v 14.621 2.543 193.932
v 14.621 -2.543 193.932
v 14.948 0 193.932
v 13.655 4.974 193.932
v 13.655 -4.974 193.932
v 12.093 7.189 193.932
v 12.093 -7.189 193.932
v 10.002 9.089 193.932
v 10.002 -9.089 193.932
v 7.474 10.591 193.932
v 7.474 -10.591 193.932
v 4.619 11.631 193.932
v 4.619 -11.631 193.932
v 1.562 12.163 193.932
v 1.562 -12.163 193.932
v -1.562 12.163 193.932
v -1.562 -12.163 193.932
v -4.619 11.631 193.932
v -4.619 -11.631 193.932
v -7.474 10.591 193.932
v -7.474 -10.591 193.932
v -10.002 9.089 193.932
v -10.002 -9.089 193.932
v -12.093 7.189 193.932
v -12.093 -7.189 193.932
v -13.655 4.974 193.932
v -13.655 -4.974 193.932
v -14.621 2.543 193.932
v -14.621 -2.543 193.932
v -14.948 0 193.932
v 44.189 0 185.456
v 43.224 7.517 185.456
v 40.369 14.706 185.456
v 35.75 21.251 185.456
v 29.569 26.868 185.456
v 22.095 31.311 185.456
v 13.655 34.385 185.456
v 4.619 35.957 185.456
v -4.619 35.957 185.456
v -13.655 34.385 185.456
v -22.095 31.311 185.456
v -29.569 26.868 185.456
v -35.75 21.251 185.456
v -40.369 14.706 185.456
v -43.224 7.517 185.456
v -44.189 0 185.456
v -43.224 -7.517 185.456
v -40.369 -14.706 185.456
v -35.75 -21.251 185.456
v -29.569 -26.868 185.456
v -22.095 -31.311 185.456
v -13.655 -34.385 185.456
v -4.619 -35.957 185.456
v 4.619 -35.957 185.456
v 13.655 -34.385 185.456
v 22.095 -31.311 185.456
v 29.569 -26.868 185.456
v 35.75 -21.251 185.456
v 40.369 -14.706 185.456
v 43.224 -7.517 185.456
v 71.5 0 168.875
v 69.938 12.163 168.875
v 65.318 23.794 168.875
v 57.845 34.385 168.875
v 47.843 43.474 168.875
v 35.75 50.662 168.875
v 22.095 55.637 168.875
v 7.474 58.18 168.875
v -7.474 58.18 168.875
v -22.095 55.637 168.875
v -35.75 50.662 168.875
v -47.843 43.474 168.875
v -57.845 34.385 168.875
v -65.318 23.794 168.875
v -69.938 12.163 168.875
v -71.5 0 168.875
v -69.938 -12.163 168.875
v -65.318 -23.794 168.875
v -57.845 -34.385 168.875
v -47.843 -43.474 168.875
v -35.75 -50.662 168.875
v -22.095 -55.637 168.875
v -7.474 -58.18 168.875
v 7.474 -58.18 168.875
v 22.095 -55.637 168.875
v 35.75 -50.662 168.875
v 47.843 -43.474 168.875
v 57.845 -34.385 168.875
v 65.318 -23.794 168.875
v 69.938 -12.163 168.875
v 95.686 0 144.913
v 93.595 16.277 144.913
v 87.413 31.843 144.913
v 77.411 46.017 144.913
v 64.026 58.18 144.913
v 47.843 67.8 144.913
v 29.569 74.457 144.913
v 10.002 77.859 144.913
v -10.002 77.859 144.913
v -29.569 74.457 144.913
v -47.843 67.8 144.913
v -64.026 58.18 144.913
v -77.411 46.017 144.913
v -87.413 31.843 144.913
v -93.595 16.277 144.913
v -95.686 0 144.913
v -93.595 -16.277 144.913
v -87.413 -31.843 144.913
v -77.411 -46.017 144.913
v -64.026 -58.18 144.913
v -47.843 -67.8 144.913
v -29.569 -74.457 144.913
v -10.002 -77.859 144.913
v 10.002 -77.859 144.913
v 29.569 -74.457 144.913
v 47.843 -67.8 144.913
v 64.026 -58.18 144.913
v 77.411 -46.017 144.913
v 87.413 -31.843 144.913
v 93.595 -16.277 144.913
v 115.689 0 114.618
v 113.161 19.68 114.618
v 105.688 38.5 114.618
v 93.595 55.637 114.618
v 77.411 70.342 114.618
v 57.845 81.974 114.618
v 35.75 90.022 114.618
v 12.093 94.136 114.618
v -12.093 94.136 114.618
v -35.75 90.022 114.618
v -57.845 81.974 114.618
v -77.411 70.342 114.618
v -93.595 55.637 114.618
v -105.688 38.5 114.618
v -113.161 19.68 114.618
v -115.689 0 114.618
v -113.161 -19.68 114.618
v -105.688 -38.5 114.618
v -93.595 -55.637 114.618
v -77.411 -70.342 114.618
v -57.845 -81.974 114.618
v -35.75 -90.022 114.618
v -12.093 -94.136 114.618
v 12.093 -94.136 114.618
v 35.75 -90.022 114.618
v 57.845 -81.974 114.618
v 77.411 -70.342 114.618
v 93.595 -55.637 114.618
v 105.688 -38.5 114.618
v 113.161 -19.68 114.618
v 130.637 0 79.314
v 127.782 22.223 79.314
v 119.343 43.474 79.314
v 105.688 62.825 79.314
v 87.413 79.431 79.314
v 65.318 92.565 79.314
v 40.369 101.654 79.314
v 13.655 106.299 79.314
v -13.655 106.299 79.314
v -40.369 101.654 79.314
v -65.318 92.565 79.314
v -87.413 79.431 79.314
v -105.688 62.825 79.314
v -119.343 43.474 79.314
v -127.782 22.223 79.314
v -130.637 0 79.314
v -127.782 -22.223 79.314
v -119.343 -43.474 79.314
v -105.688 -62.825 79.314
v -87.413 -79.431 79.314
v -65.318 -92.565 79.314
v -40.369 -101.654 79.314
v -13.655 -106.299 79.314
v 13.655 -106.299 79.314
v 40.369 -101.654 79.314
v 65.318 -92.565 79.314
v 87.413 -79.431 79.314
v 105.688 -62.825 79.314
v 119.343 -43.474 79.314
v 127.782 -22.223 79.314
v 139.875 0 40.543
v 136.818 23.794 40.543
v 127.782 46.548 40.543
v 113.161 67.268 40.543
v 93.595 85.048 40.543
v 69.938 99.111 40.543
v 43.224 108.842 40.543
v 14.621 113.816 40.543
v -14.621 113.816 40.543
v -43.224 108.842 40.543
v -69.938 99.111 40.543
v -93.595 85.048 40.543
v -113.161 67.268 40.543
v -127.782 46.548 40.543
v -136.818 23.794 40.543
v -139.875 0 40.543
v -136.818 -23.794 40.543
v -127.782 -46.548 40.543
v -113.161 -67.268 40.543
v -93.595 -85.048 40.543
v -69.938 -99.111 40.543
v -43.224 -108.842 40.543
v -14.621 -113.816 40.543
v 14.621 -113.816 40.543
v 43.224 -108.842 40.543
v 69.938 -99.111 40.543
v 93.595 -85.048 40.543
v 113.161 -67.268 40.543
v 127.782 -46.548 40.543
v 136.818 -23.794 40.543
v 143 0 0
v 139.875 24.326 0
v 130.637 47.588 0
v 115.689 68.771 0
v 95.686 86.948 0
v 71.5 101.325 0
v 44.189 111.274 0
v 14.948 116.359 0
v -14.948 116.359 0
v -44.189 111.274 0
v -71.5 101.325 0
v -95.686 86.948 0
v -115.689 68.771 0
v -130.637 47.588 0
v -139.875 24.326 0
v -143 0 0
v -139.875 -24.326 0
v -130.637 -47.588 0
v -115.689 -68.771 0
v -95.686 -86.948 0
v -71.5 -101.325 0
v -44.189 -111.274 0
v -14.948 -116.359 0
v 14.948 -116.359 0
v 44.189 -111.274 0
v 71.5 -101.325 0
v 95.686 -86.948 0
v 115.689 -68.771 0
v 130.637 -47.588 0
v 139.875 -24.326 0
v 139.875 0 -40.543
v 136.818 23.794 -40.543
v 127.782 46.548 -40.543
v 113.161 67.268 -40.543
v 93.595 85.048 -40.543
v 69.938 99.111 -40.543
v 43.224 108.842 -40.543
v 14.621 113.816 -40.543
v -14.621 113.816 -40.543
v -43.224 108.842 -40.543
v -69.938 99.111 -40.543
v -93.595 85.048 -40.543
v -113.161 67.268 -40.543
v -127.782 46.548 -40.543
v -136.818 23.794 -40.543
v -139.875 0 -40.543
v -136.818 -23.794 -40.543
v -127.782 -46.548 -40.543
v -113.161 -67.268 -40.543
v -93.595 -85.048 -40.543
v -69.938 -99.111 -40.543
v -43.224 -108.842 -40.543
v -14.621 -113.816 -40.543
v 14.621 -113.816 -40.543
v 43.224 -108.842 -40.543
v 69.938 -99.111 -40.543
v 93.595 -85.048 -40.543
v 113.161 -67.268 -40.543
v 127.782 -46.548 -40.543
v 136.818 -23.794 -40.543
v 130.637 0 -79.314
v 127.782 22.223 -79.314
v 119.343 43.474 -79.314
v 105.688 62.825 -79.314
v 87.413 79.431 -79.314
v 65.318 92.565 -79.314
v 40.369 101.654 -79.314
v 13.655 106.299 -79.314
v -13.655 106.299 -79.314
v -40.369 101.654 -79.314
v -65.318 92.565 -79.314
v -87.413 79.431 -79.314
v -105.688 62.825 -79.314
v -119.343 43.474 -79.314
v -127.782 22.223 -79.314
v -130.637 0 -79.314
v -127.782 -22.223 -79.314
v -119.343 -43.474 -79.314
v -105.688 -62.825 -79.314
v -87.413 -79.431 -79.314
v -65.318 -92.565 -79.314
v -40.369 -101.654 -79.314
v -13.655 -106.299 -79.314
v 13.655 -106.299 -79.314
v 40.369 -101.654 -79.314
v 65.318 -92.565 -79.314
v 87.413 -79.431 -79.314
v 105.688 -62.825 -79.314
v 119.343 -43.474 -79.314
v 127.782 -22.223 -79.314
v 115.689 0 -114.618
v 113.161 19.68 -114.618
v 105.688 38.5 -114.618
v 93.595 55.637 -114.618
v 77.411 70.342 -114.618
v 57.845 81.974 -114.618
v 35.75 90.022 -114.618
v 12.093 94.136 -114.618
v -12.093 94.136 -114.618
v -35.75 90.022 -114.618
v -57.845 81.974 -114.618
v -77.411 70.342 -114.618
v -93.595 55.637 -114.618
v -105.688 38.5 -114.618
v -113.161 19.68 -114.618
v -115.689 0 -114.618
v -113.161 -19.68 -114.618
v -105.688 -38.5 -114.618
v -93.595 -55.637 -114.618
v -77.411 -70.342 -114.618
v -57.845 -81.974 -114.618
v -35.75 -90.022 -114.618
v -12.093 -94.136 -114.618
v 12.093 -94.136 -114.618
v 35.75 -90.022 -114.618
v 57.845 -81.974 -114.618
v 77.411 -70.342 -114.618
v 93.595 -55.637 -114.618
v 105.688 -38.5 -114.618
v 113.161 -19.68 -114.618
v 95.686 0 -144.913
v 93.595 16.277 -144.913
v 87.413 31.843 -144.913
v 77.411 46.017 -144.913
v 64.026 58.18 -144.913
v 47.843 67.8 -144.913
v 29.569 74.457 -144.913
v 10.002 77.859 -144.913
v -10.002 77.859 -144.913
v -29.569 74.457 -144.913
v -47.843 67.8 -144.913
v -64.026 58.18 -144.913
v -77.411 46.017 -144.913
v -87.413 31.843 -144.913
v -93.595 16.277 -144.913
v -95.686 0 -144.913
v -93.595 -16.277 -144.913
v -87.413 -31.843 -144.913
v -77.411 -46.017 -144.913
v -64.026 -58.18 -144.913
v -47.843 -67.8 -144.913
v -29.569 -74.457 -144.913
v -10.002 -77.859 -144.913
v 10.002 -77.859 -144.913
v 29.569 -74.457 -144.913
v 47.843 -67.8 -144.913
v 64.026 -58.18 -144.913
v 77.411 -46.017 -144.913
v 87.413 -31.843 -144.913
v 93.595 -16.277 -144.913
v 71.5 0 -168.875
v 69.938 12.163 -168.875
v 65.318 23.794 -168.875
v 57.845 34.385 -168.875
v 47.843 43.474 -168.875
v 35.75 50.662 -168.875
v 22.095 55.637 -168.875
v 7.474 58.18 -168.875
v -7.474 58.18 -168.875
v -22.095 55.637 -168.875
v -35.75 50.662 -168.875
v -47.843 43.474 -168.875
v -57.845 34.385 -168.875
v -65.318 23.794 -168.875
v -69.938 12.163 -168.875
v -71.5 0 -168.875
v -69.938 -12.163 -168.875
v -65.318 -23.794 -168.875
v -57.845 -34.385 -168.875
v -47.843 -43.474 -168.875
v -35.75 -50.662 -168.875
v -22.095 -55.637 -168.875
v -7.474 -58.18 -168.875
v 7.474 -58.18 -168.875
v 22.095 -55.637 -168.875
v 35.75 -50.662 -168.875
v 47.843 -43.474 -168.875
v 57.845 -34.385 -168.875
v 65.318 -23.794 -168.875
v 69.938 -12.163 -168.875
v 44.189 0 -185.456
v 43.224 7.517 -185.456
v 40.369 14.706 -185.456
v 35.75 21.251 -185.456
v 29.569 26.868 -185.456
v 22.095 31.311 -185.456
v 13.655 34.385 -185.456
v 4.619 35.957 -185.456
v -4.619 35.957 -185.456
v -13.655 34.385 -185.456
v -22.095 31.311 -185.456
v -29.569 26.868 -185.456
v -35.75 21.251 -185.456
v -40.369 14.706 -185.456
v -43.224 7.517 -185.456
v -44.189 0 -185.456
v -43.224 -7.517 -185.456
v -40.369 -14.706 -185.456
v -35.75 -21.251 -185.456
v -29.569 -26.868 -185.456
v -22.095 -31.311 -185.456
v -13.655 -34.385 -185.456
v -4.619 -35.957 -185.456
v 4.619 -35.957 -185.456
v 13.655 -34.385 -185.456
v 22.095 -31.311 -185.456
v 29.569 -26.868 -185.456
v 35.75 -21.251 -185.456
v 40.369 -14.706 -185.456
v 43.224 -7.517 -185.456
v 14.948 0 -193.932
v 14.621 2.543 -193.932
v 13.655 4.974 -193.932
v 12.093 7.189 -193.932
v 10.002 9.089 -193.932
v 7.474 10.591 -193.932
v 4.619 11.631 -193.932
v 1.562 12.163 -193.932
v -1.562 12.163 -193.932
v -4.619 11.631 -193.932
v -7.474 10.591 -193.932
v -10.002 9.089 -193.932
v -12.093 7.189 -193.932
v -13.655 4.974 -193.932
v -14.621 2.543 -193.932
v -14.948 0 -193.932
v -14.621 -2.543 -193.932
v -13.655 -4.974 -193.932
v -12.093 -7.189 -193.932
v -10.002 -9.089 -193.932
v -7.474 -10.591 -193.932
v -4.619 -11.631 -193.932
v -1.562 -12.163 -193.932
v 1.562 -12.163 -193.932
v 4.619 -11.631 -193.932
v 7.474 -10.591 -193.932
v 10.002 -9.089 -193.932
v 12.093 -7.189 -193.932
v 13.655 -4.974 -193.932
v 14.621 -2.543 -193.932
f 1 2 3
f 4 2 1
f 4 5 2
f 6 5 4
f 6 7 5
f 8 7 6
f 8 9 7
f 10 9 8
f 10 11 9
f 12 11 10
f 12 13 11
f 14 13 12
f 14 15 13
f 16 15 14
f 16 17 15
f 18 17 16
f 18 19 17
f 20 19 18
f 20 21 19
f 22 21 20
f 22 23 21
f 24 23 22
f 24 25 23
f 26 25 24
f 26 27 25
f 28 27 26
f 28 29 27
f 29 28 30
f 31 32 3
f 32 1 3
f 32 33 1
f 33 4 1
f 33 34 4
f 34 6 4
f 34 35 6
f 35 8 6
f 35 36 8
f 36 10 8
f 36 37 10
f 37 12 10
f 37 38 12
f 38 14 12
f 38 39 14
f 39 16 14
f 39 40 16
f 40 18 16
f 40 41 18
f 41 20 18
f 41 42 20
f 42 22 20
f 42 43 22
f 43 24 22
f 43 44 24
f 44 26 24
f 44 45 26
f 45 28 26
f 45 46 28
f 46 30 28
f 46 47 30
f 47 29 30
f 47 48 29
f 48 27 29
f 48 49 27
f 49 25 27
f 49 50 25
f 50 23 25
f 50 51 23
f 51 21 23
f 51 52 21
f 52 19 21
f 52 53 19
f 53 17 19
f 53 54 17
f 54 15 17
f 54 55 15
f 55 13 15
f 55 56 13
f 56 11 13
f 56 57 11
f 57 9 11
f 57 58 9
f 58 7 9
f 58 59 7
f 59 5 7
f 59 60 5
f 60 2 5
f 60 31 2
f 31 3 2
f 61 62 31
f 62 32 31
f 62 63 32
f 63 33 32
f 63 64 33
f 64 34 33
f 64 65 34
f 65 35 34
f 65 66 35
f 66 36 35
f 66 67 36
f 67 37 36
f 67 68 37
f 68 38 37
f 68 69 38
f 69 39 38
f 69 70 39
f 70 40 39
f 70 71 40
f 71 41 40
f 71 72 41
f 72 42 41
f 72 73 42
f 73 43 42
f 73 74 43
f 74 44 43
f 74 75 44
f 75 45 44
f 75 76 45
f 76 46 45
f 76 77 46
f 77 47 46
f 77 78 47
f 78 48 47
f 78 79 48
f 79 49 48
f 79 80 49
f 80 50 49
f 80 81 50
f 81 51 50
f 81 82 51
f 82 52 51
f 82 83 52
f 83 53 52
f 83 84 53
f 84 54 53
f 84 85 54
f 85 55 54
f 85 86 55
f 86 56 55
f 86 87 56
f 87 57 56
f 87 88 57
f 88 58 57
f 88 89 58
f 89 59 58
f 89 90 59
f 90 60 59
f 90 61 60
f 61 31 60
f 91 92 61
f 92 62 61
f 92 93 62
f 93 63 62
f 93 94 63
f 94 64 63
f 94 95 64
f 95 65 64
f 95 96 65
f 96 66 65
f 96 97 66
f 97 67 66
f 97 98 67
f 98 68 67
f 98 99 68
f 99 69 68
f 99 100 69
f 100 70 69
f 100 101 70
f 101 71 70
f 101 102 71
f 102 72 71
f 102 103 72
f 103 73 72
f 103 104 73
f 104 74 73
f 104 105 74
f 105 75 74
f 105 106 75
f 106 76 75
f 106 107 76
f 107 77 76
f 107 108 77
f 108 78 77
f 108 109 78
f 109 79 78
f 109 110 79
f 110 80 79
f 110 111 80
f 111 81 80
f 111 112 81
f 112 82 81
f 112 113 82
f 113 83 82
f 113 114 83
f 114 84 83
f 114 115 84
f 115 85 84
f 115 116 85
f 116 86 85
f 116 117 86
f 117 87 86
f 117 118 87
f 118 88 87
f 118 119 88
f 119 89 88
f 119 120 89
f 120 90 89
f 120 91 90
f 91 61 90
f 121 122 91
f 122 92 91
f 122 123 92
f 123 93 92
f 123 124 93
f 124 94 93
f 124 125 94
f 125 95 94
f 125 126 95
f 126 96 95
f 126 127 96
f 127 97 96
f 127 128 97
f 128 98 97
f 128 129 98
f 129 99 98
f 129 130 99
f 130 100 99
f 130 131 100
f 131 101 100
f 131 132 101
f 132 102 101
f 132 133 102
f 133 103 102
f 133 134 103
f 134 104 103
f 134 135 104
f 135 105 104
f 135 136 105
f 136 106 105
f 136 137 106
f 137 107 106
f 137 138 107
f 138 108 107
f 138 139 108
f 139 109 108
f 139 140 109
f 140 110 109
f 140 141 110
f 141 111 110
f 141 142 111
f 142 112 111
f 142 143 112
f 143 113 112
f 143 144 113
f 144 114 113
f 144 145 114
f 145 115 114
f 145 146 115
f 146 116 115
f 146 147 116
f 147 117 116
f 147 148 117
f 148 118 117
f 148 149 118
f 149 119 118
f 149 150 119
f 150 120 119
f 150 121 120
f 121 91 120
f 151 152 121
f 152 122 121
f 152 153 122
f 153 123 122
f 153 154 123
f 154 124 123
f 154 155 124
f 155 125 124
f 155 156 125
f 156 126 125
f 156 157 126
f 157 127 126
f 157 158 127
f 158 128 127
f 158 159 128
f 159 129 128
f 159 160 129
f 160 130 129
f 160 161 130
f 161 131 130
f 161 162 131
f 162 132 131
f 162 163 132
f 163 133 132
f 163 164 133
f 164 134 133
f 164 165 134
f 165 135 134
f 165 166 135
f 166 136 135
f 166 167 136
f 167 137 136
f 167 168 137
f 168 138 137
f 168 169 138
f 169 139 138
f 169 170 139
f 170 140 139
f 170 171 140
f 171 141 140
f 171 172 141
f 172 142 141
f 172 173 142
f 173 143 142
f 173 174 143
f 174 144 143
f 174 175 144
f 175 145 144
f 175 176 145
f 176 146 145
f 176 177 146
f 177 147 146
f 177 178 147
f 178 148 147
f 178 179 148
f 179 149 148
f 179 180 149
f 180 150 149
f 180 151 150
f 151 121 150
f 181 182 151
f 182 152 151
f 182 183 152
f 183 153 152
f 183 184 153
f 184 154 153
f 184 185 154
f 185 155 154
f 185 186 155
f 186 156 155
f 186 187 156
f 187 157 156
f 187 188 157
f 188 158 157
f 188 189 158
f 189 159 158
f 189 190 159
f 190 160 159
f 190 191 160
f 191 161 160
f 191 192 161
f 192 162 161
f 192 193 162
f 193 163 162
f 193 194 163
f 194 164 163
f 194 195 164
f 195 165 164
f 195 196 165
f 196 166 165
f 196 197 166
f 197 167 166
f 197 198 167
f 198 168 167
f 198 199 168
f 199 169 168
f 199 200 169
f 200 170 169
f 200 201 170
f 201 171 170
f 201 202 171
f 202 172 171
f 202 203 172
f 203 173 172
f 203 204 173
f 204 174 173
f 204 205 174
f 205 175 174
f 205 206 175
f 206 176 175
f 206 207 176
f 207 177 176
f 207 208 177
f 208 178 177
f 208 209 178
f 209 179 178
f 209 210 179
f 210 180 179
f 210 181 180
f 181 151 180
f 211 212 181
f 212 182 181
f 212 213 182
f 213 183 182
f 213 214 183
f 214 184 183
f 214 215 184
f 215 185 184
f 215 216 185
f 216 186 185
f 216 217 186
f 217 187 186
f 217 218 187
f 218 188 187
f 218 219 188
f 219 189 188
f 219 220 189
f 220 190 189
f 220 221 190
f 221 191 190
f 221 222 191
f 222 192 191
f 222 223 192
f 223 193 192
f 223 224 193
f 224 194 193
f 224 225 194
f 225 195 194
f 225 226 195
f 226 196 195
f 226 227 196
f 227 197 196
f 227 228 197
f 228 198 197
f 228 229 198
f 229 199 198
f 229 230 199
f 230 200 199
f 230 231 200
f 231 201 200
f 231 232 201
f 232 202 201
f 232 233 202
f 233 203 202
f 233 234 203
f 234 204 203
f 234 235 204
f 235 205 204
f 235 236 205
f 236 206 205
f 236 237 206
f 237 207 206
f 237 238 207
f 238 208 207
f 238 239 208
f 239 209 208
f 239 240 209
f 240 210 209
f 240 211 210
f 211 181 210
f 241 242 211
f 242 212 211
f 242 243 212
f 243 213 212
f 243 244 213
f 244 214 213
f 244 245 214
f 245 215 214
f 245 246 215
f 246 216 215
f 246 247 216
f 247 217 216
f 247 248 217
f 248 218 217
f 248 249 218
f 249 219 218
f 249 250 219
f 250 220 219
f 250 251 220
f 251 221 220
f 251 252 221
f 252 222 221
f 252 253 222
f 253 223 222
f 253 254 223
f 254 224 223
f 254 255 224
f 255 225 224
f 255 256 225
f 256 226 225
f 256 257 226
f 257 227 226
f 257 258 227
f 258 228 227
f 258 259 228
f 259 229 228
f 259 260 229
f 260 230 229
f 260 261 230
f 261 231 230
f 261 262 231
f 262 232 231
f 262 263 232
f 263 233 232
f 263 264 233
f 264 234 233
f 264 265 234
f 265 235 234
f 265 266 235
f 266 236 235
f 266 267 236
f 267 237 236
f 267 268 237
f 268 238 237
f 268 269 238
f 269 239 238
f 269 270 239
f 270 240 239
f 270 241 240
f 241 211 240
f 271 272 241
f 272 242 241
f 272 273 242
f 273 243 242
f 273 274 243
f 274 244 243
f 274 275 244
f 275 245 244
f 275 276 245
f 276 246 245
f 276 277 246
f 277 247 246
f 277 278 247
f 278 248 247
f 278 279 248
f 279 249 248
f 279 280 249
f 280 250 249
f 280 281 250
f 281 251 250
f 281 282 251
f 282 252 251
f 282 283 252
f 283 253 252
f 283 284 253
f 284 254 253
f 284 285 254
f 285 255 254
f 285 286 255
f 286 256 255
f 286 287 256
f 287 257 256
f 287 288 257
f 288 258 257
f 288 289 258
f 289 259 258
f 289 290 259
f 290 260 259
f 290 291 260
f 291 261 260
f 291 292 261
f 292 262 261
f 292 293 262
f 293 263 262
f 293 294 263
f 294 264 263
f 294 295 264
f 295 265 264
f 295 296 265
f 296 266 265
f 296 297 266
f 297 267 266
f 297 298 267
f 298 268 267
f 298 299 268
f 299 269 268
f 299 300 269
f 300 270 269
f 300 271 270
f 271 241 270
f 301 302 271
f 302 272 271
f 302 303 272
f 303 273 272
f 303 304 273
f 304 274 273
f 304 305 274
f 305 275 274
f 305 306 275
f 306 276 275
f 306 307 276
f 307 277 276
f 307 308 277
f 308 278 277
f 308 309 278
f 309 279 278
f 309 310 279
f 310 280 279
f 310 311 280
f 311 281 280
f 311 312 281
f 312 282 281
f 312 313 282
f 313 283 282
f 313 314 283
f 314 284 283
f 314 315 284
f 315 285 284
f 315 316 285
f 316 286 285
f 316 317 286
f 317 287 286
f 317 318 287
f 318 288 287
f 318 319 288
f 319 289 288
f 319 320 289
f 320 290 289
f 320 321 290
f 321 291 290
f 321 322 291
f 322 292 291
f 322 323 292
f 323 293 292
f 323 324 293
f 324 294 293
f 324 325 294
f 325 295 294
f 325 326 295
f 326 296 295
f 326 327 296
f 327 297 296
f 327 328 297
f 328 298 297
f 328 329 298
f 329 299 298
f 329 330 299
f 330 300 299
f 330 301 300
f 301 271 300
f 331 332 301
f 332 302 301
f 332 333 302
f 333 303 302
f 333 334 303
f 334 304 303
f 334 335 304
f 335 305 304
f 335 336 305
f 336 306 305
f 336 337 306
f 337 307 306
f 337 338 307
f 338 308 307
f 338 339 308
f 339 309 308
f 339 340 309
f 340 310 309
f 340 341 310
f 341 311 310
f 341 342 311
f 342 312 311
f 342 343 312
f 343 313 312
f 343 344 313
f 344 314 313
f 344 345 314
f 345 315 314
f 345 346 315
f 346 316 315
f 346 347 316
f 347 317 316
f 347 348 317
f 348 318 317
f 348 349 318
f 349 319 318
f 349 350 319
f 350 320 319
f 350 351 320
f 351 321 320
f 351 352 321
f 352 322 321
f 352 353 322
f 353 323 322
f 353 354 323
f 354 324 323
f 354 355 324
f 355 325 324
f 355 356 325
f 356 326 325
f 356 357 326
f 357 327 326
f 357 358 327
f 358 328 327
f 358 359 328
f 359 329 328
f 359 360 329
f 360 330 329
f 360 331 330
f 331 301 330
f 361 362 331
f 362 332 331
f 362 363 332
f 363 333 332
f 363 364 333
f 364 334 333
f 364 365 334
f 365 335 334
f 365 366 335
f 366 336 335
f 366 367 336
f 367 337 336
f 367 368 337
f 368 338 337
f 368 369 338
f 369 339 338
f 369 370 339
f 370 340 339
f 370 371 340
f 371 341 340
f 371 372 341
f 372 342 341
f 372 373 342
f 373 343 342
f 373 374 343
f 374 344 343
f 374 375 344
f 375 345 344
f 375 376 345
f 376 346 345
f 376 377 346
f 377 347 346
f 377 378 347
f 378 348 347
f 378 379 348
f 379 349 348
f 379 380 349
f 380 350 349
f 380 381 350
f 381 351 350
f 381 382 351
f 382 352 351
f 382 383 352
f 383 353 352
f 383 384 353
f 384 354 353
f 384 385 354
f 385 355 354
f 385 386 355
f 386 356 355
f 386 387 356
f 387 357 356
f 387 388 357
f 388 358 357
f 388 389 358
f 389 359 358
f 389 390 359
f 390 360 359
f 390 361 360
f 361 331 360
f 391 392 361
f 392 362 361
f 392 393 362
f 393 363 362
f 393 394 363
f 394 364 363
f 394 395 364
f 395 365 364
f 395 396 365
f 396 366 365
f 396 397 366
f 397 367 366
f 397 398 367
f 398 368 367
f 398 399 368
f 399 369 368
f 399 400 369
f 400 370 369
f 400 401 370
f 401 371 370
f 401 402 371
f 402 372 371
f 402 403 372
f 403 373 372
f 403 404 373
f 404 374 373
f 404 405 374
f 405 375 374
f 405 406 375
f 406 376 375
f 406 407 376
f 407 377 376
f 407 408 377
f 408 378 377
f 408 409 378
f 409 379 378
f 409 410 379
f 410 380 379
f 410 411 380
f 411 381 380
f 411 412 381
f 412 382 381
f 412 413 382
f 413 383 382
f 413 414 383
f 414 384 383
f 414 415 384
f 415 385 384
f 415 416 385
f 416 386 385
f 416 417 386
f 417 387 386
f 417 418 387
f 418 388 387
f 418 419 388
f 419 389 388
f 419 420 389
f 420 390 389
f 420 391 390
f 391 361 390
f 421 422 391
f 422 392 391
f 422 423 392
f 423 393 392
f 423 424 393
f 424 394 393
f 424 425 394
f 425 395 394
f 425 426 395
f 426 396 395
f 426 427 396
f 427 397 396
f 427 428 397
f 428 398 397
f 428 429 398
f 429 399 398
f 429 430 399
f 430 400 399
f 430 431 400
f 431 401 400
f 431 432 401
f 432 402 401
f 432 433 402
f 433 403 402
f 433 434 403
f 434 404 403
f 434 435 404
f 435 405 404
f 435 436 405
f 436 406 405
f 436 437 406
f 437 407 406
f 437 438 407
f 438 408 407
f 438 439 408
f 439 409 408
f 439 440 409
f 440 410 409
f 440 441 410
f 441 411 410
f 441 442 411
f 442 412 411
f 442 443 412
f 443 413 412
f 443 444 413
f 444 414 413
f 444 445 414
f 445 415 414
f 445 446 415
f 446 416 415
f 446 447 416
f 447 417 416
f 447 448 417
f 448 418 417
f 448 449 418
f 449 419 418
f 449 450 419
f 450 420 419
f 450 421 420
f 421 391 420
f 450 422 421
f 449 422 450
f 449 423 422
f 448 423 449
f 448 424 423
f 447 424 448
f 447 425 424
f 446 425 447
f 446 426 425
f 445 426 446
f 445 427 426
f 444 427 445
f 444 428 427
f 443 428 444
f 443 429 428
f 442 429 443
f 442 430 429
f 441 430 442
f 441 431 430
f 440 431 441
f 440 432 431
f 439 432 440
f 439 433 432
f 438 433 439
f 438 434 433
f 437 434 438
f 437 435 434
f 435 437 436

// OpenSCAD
// Generated by SolidPython 1.0.1 on 2020-07-29 00:46:49


scale(v = [11, 9, 15]) {
	sphere(r = 13);
}
/***********************************************
*********      SolidPython code:      **********
************************************************
 
# import packages: SolidPython
from solid import *
from solid.utils import *
from itertools import chain, combinations, permutations


class Resize:

    def __init__(self, scad_file):
        self.scad_file = scad_file
        #self.scad_file = import_scad(scad_file)
        # cone/cylinder param:
        self.r1 = 0
        self.r2 = 0
        self.h = 0
        # rectangular prism param:
        self.w = 0
        self.l = 0
        # ellipse param:
        self.r = 0

    # import OpenScad code (file name corresponds to shape)


    # classify shape + parameters
    def assign(self, param1, param2, param3):
        if self.scad_file == 'cone.scad':
            self.r1 = param1
            self.r2 = param2
            self.h = param3
        elif self.scad_file == 'cylinder.scad':
            self.r1 = param1
            self.r2 = param2
            self.h = param3
        elif self.scad_file == 'rectangularPrism.scad':
            self.h = param1
            self.l = param2
            self.w = param3
        else:
            self.r = param1
            self.h = param2

    # resize parameters
    def iterate(self):
        x = range(3, 20, 2)
        i = 1
        if self.scad_file == 'cone.scad':
            tempList = list(permutations(x, 2))
            for temp in tempList:
                param1 = temp[0]
                param2 = temp[1]
                filepath = 'produced_scad_files/' + 'cone' + str(param1) + '_' + str(param2) + '_' + '.scad'
                scad_render_to_file(cylinder(h=param1, r1=param2, r2=0), filepath)

        elif self.scad_file == 'cylinder.scad':
            tempList = list(permutations(x, 3))
            for temp in tempList:
                param1 = temp[0]
                param2 = temp[1]
                filepath = 'produced_scad_files/' + 'cylinder' + str(param1) + '_' + str(param2) + '_' + '.scad'
                scad_render_to_file(cylinder(h=param1, r1=param2, r2=param2), filepath)

        elif self.scad_file == 'rectangularPrism.scad':
            tempList = list(permutations(x, 3))
            for temp in tempList:
                param1 = temp[0]
                param2 = temp[1]
                param3 = temp[2]
                filepath = 'produced_scad_files/' + 'rectangularPrism' + str(param1) + '_' + str(param2) + '_' + str(
                    param3) + '.scad'
                scad_render_to_file(cube(size=(param1, param2, param3)), filepath)

        elif self.scad_file == 'ellipse.scad':
            tempList = list(permutations(x, 4))
            for temp in tempList:
                param1 = temp[0]
                param2 = temp[1]
                param3 = temp[2]
                param4 = temp[3]
                filepath = 'produced_scad_files/' + 'ellipse' + str(param1) + '_' + str(param2) + '_' + str(param3) + '_' + str(param4) + '.scad'
                scad_render_to_file(scale([param1, param2, param3])(sphere(r=param4)), filepath)

    def render_to_scadfile(self):
        scad_render_to_file(scad, 'example.scad') 
 
************************************************/
